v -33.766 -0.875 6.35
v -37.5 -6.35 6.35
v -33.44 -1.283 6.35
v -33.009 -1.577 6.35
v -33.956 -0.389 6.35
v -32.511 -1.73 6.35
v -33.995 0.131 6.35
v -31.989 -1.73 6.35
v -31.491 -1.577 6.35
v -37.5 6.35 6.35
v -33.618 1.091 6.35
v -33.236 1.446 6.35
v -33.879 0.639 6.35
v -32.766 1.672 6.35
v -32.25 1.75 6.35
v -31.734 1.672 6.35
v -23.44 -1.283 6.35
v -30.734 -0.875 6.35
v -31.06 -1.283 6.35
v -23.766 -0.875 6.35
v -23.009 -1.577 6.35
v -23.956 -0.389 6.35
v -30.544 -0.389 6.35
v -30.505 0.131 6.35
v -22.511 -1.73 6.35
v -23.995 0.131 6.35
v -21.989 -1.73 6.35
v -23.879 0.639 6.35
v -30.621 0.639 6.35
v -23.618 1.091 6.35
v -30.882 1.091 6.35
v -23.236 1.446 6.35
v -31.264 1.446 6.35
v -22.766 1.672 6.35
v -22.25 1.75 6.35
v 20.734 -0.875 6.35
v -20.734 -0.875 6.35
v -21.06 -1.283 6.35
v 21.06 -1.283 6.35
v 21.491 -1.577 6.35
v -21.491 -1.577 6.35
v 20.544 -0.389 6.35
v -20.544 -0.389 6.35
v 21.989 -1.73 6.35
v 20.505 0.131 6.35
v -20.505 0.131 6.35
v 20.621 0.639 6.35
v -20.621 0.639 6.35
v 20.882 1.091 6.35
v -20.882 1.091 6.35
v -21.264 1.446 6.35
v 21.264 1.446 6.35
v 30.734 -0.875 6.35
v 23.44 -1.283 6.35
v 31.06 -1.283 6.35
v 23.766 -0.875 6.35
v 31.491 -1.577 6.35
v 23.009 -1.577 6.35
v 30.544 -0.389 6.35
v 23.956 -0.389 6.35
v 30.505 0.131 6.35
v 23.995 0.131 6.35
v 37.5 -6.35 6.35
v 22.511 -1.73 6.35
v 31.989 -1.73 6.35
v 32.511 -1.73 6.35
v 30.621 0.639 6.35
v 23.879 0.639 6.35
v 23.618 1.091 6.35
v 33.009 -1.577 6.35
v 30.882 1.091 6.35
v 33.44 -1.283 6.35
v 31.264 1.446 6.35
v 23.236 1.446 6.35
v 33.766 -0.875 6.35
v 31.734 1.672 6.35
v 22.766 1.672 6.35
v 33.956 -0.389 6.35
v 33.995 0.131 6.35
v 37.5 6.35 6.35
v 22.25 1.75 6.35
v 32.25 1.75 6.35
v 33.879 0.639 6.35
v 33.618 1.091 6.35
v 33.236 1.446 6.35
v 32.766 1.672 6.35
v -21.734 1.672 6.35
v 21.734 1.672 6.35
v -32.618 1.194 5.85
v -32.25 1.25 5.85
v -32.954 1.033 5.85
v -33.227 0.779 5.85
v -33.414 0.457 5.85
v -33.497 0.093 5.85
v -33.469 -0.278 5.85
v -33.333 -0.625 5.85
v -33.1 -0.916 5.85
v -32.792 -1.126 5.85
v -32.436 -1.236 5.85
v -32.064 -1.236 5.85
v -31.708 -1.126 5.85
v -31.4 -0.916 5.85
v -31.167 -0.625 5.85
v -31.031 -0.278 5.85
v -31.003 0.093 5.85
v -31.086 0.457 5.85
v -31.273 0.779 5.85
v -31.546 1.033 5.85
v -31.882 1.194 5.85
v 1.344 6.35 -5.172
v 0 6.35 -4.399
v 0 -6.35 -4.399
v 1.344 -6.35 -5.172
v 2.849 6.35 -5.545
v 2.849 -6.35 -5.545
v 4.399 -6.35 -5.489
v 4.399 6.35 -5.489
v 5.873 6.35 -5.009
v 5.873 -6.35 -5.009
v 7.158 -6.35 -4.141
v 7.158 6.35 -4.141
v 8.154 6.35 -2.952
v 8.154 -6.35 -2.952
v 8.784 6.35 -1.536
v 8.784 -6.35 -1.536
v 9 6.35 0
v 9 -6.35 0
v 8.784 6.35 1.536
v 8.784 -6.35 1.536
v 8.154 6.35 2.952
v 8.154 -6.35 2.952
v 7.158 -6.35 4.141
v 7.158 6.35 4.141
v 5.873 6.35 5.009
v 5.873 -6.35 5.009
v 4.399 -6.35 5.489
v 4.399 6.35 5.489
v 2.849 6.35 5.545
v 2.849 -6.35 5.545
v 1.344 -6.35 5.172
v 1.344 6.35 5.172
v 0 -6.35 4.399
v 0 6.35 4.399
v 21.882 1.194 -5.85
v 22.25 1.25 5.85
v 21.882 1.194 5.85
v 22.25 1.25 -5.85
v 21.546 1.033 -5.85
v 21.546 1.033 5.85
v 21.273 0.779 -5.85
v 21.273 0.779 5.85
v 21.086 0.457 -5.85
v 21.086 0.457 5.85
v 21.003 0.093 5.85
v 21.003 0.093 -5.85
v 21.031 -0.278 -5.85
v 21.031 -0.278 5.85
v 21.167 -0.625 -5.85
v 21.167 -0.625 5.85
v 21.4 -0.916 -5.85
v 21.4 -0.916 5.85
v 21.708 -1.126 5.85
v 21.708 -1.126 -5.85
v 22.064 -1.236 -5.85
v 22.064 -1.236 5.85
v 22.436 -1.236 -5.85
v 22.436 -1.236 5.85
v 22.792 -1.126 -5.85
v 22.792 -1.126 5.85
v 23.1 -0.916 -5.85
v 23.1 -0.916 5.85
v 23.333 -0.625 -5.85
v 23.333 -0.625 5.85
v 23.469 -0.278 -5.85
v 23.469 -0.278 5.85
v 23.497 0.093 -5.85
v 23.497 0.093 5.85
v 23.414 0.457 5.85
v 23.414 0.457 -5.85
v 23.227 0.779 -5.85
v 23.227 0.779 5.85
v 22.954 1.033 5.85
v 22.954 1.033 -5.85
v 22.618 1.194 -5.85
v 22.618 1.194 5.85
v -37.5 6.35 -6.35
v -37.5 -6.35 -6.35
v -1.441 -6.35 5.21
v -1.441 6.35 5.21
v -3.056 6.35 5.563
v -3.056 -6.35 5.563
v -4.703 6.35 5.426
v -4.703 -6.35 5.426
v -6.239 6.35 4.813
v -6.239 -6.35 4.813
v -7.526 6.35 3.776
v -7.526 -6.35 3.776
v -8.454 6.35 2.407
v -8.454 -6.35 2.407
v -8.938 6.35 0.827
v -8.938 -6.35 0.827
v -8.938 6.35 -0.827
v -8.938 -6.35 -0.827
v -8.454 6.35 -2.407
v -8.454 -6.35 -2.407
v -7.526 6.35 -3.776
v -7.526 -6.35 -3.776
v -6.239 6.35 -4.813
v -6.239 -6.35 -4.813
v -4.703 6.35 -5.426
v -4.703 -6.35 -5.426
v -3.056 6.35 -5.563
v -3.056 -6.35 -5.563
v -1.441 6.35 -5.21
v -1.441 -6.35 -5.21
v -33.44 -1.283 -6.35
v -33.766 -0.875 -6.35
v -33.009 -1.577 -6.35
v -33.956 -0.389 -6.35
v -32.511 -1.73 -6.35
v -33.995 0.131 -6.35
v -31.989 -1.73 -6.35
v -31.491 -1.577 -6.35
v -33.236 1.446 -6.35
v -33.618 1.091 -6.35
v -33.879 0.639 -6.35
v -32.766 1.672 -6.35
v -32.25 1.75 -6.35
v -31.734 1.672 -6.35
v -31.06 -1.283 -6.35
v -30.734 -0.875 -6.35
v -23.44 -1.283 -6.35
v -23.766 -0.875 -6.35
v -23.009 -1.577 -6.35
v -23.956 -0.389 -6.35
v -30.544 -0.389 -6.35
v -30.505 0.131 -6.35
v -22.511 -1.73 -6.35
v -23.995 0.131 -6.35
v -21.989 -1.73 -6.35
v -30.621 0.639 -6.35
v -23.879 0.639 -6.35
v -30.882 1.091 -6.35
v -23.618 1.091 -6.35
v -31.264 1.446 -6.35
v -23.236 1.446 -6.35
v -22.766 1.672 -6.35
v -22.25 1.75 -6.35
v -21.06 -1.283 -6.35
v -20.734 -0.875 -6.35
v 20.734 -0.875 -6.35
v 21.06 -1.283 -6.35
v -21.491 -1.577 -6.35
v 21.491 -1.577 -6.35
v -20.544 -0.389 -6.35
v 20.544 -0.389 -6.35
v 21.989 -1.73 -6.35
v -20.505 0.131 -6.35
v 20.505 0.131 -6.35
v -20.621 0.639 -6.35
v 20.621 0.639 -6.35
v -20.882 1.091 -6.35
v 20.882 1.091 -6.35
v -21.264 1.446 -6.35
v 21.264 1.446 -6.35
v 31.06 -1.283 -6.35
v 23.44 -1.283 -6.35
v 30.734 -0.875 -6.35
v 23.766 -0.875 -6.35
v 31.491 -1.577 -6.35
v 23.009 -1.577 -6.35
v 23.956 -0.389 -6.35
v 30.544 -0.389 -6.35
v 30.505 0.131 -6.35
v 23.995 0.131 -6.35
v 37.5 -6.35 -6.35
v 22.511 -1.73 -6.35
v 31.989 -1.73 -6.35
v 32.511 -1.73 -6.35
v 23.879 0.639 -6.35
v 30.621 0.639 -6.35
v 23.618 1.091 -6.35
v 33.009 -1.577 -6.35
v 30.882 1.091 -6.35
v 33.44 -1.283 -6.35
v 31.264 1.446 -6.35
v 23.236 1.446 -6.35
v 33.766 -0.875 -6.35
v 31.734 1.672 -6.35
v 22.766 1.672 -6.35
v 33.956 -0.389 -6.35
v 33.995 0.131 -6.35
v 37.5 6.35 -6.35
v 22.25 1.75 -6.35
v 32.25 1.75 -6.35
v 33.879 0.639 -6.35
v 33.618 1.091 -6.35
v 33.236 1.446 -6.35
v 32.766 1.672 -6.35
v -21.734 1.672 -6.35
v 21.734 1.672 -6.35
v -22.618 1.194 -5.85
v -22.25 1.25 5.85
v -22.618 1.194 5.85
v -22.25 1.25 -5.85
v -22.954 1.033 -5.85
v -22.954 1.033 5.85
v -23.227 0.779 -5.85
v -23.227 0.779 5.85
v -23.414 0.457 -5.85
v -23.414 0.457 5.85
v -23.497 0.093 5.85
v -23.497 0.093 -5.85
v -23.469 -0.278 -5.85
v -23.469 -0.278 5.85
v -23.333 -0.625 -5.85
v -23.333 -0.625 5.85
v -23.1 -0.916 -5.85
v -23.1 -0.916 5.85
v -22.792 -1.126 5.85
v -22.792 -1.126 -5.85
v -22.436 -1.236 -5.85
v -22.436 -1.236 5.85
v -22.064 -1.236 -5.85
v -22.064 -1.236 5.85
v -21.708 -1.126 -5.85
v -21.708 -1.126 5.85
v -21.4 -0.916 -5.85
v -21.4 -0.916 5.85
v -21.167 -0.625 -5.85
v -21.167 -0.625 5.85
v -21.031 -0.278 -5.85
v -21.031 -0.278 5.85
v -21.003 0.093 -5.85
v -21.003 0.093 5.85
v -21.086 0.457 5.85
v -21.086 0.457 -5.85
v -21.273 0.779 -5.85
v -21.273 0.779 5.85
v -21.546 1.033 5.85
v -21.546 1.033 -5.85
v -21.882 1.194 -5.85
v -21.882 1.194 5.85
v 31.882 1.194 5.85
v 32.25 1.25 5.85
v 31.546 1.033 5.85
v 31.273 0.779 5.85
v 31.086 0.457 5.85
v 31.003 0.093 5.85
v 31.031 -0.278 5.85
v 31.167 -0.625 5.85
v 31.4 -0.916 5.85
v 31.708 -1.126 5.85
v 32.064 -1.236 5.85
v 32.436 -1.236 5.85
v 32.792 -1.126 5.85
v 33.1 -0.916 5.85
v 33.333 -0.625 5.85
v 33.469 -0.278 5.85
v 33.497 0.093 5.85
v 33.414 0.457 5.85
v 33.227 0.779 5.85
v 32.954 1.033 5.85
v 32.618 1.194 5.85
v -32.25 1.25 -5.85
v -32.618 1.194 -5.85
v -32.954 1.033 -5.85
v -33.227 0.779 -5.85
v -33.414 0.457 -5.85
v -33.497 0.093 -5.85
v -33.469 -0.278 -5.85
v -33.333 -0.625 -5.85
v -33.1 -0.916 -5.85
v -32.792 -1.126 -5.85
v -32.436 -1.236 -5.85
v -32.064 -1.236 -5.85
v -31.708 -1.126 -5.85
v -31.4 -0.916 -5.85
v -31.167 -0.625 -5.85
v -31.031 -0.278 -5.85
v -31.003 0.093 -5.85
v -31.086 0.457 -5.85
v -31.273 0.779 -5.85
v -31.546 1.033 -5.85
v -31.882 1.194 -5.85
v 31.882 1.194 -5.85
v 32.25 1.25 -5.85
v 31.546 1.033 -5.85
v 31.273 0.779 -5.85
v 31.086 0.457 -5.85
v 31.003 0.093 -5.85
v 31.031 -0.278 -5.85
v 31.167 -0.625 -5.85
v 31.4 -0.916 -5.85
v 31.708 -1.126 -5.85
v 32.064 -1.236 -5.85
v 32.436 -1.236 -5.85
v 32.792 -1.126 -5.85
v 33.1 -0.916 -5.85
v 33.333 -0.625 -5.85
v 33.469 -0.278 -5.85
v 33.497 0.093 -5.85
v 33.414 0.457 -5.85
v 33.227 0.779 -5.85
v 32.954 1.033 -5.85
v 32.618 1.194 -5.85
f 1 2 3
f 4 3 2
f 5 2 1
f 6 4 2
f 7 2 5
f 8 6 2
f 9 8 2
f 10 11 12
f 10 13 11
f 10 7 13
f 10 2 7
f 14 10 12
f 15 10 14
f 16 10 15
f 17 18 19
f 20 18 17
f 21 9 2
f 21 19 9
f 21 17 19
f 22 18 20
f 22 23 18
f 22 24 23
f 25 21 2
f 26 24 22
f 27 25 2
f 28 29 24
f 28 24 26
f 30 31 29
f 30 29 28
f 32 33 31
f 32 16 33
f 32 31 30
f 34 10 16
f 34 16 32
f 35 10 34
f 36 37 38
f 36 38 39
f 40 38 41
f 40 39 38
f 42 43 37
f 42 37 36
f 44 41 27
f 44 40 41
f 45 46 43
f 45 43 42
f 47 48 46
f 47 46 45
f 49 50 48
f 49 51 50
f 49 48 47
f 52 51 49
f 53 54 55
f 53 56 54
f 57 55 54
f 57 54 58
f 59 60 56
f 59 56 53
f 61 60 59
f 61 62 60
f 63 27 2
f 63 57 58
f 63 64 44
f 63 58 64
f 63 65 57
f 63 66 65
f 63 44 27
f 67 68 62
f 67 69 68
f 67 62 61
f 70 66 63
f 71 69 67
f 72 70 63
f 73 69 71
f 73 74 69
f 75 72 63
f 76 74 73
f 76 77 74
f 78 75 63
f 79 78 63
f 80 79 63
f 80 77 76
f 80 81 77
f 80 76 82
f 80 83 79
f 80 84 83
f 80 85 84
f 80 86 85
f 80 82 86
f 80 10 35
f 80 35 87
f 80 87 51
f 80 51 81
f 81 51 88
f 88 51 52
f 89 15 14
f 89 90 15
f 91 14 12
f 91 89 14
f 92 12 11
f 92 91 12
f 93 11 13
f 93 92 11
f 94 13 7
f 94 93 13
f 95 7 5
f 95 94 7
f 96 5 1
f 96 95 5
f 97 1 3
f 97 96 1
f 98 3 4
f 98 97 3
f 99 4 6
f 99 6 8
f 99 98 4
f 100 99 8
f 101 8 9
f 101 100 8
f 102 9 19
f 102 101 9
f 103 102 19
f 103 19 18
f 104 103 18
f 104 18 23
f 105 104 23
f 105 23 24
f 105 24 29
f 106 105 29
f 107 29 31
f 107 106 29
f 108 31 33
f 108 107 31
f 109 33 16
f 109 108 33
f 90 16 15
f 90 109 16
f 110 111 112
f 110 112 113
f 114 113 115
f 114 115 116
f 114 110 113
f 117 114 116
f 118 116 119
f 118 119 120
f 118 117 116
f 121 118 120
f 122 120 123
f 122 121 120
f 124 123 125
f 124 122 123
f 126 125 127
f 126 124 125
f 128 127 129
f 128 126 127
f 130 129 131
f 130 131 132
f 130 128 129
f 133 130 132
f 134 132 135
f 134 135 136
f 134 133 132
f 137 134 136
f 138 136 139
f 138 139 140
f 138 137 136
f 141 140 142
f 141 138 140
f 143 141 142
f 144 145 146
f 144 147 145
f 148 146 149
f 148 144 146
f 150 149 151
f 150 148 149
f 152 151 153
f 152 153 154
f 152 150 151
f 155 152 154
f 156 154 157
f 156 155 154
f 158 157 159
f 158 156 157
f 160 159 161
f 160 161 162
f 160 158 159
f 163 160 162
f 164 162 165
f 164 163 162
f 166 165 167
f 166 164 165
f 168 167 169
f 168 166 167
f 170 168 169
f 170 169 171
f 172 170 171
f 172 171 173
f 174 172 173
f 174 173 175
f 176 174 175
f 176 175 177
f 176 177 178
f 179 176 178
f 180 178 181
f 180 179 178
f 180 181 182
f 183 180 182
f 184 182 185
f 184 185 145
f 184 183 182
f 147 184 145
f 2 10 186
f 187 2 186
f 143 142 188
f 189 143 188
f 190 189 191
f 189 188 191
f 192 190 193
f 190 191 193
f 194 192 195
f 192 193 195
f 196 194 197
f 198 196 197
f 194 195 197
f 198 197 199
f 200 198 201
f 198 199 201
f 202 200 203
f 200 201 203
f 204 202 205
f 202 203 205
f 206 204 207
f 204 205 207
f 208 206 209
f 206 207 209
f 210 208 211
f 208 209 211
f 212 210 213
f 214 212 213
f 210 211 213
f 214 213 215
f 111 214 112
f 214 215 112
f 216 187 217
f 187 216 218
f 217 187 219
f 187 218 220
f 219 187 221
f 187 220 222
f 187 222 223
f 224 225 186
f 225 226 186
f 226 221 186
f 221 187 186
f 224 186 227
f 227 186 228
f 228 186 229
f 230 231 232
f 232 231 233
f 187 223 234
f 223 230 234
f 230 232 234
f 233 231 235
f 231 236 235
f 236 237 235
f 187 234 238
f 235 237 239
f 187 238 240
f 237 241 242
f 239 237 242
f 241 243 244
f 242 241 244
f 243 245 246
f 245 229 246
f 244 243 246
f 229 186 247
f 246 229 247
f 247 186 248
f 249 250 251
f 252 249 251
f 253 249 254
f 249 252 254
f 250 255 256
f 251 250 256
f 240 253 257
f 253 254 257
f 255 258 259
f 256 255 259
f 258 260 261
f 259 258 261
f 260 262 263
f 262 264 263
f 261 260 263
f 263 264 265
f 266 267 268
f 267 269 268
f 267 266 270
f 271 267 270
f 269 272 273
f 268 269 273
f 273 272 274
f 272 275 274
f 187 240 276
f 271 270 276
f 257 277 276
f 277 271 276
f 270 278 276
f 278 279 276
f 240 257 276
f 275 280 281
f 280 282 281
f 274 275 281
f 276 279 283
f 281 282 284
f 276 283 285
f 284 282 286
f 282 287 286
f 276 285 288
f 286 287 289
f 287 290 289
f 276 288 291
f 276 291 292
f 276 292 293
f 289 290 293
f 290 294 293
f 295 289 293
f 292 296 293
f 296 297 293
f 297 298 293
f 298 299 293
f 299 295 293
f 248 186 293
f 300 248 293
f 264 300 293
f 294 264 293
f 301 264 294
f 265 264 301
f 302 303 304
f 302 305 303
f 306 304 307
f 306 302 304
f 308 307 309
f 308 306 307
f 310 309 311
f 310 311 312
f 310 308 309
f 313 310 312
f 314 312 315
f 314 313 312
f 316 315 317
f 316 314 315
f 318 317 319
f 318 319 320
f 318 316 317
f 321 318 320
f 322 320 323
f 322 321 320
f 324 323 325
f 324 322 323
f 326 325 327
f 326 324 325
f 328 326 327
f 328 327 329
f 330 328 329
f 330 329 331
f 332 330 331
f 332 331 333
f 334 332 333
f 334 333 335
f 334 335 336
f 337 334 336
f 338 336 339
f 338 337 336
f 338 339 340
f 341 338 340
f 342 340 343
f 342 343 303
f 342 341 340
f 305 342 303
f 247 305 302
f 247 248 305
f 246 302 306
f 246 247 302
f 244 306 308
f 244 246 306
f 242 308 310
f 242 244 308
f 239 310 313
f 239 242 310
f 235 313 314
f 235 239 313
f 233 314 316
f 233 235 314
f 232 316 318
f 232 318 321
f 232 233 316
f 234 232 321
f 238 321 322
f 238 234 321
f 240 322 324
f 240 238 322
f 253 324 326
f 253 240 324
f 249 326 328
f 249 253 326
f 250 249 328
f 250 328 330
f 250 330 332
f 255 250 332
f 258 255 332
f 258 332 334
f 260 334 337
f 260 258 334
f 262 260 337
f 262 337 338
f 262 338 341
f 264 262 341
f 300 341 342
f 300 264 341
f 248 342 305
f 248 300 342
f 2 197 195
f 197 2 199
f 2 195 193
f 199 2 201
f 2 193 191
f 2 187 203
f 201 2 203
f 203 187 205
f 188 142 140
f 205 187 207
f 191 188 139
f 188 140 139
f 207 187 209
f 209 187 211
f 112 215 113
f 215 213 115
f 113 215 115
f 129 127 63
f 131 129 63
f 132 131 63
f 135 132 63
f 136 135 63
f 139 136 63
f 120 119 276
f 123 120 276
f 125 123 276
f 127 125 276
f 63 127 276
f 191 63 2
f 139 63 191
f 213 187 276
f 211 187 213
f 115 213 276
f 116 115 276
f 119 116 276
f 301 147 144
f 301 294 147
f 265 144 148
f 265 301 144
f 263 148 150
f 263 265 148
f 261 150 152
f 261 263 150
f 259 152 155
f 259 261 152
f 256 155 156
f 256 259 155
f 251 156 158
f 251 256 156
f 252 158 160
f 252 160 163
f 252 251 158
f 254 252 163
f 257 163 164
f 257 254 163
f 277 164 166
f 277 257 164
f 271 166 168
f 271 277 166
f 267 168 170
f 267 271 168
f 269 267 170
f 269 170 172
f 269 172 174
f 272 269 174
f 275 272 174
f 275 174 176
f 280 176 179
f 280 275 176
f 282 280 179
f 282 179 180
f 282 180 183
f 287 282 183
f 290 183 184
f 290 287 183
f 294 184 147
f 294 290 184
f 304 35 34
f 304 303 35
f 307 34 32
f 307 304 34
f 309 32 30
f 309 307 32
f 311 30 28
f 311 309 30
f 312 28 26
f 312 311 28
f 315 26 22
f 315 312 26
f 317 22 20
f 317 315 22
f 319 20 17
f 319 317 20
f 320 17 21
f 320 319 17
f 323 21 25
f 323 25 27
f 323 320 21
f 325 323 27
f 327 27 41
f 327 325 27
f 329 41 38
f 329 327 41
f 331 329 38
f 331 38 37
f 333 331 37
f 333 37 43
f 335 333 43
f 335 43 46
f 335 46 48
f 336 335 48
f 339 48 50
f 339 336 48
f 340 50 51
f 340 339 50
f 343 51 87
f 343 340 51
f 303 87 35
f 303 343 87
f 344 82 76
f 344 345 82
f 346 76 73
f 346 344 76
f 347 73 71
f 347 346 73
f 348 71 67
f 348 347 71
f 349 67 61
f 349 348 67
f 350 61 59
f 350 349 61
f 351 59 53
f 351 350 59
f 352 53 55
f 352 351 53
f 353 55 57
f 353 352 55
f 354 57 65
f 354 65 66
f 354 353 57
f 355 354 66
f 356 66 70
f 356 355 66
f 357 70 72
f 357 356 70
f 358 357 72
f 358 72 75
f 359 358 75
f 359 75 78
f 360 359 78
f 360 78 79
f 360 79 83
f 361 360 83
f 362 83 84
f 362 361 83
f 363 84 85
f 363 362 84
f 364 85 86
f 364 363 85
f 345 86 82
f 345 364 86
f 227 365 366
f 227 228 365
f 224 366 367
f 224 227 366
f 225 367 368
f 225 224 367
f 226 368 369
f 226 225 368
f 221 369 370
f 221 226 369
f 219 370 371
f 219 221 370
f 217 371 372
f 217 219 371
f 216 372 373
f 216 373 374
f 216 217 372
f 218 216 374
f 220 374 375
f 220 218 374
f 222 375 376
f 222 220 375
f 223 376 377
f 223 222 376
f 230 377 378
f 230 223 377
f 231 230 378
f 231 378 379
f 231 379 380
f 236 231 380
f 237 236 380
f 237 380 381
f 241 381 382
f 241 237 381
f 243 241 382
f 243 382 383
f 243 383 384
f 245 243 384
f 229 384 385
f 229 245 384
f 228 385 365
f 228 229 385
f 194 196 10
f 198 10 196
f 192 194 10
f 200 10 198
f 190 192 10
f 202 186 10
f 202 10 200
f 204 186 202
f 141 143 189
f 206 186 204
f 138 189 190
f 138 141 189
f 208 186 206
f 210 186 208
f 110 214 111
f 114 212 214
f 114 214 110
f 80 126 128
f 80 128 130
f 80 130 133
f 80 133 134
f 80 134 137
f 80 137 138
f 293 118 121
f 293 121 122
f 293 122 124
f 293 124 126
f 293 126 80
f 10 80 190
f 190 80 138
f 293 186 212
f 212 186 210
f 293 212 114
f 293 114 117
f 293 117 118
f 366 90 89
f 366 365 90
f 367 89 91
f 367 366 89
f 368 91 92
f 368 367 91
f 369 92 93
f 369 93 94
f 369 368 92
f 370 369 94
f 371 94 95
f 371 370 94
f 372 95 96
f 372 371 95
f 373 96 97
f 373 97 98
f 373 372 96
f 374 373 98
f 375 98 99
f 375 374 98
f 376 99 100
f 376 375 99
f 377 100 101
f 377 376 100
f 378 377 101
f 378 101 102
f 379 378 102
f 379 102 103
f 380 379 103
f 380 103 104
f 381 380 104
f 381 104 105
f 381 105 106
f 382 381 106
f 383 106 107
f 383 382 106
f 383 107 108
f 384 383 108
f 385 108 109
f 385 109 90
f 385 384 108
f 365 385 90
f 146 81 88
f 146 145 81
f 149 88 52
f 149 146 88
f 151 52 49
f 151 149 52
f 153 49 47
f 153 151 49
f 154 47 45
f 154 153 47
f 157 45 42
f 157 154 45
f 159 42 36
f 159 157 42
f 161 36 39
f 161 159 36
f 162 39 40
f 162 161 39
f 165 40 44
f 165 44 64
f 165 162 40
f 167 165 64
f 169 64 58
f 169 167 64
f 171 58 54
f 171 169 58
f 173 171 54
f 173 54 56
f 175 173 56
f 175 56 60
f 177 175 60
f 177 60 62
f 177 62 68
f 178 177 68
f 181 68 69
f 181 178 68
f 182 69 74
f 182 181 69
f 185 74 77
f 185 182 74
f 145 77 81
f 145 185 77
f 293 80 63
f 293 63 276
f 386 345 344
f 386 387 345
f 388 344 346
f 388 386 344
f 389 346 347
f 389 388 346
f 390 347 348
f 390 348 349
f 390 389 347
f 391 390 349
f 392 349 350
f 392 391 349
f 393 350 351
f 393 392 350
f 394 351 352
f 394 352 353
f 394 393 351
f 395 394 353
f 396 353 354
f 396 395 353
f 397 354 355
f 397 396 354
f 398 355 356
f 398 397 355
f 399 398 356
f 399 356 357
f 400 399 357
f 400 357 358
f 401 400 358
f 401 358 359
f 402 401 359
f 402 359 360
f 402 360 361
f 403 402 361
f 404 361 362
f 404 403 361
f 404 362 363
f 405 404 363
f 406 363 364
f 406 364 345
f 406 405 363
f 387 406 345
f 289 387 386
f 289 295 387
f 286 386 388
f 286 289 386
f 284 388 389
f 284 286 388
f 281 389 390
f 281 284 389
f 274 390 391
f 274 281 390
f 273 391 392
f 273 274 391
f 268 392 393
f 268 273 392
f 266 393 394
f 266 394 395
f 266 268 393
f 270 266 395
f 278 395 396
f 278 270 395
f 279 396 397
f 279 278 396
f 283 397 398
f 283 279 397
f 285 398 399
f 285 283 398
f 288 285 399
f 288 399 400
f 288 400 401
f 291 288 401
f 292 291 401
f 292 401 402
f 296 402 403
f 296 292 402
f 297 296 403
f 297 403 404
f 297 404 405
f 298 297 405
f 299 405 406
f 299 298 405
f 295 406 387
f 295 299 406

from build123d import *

# Parameters (mm, degrees)
SKETCH1_W                  = 75
SKETCH1_H                  = 12.7
BOSS_EXTRUDE1_DEPTH        = 6.35
M3_TAPPED_HOLE1_AT_2_COUNT = 2
M3_TAPPED_HOLE1_AT_2_PITCH = 10
M3_TAPPED_HOLE1_AT_3_COUNT = 2
M3_TAPPED_HOLE1_AT_3_PITCH = 54.5
M3_TAPPED_HOLE1_AT_4_COUNT = 2
M3_TAPPED_HOLE1_AT_4_PITCH = 64.5


with BuildPart() as part:
    # Sketch1 → Boss-Extrude1 (new, symmetric)
    with BuildSketch(Plane(origin=(0, 0, 0), x_dir=(1, 0, 0), z_dir=(0, 1, 0))):
        Rectangle(SKETCH1_W, SKETCH1_H)
        with BuildLine():
            ThreePointArc((0, -4.39886349), (-9, 0), (0, 4.39886349))
            ThreePointArc((0, 4.39886349), (5.873085987, 5.008742357), (9, 0))
            ThreePointArc((9, 0), (5.873085987, -5.008742357), (0, -4.39886349))
        make_face(mode=Mode.SUBTRACT)
    extrude(amount=BOSS_EXTRUDE1_DEPTH, both=True)

    # Sketch5 → M3 Tapped Hole1 (revolve, cut)
    with BuildSketch(Plane(origin=(-32.25, 0, -6.35), x_dir=(0, 1, 0), z_dir=(1, 0, 0))):
        Polygon((0, 0), (0, 12.7), (1.75, 12.7), (1.25, 12.2), (1.25, 0.5), (1.75, 0), align=None)
    m3_tapped_hole1 = revolve(axis=Axis((-32.25, 0, -12.7), (0, 0, 1)), mode=Mode.SUBTRACT)

    # M3 Tapped Hole1 at 2: M3 Tapped Hole1 ×2
    with Locations(*[(i * M3_TAPPED_HOLE1_AT_2_PITCH, 0, 0) for i in range(1, M3_TAPPED_HOLE1_AT_2_COUNT)]):
        add(m3_tapped_hole1, mode=Mode.SUBTRACT)

    # M3 Tapped Hole1 at 3: M3 Tapped Hole1 ×2
    with Locations(*[(i * M3_TAPPED_HOLE1_AT_3_PITCH, 0, 0) for i in range(1, M3_TAPPED_HOLE1_AT_3_COUNT)]):
        add(m3_tapped_hole1, mode=Mode.SUBTRACT)

    # M3 Tapped Hole1 at 4: M3 Tapped Hole1 ×2
    with Locations(*[(i * M3_TAPPED_HOLE1_AT_4_PITCH, 0, 0) for i in range(1, M3_TAPPED_HOLE1_AT_4_COUNT)]):
        add(m3_tapped_hole1, mode=Mode.SUBTRACT)


solid = part.part
